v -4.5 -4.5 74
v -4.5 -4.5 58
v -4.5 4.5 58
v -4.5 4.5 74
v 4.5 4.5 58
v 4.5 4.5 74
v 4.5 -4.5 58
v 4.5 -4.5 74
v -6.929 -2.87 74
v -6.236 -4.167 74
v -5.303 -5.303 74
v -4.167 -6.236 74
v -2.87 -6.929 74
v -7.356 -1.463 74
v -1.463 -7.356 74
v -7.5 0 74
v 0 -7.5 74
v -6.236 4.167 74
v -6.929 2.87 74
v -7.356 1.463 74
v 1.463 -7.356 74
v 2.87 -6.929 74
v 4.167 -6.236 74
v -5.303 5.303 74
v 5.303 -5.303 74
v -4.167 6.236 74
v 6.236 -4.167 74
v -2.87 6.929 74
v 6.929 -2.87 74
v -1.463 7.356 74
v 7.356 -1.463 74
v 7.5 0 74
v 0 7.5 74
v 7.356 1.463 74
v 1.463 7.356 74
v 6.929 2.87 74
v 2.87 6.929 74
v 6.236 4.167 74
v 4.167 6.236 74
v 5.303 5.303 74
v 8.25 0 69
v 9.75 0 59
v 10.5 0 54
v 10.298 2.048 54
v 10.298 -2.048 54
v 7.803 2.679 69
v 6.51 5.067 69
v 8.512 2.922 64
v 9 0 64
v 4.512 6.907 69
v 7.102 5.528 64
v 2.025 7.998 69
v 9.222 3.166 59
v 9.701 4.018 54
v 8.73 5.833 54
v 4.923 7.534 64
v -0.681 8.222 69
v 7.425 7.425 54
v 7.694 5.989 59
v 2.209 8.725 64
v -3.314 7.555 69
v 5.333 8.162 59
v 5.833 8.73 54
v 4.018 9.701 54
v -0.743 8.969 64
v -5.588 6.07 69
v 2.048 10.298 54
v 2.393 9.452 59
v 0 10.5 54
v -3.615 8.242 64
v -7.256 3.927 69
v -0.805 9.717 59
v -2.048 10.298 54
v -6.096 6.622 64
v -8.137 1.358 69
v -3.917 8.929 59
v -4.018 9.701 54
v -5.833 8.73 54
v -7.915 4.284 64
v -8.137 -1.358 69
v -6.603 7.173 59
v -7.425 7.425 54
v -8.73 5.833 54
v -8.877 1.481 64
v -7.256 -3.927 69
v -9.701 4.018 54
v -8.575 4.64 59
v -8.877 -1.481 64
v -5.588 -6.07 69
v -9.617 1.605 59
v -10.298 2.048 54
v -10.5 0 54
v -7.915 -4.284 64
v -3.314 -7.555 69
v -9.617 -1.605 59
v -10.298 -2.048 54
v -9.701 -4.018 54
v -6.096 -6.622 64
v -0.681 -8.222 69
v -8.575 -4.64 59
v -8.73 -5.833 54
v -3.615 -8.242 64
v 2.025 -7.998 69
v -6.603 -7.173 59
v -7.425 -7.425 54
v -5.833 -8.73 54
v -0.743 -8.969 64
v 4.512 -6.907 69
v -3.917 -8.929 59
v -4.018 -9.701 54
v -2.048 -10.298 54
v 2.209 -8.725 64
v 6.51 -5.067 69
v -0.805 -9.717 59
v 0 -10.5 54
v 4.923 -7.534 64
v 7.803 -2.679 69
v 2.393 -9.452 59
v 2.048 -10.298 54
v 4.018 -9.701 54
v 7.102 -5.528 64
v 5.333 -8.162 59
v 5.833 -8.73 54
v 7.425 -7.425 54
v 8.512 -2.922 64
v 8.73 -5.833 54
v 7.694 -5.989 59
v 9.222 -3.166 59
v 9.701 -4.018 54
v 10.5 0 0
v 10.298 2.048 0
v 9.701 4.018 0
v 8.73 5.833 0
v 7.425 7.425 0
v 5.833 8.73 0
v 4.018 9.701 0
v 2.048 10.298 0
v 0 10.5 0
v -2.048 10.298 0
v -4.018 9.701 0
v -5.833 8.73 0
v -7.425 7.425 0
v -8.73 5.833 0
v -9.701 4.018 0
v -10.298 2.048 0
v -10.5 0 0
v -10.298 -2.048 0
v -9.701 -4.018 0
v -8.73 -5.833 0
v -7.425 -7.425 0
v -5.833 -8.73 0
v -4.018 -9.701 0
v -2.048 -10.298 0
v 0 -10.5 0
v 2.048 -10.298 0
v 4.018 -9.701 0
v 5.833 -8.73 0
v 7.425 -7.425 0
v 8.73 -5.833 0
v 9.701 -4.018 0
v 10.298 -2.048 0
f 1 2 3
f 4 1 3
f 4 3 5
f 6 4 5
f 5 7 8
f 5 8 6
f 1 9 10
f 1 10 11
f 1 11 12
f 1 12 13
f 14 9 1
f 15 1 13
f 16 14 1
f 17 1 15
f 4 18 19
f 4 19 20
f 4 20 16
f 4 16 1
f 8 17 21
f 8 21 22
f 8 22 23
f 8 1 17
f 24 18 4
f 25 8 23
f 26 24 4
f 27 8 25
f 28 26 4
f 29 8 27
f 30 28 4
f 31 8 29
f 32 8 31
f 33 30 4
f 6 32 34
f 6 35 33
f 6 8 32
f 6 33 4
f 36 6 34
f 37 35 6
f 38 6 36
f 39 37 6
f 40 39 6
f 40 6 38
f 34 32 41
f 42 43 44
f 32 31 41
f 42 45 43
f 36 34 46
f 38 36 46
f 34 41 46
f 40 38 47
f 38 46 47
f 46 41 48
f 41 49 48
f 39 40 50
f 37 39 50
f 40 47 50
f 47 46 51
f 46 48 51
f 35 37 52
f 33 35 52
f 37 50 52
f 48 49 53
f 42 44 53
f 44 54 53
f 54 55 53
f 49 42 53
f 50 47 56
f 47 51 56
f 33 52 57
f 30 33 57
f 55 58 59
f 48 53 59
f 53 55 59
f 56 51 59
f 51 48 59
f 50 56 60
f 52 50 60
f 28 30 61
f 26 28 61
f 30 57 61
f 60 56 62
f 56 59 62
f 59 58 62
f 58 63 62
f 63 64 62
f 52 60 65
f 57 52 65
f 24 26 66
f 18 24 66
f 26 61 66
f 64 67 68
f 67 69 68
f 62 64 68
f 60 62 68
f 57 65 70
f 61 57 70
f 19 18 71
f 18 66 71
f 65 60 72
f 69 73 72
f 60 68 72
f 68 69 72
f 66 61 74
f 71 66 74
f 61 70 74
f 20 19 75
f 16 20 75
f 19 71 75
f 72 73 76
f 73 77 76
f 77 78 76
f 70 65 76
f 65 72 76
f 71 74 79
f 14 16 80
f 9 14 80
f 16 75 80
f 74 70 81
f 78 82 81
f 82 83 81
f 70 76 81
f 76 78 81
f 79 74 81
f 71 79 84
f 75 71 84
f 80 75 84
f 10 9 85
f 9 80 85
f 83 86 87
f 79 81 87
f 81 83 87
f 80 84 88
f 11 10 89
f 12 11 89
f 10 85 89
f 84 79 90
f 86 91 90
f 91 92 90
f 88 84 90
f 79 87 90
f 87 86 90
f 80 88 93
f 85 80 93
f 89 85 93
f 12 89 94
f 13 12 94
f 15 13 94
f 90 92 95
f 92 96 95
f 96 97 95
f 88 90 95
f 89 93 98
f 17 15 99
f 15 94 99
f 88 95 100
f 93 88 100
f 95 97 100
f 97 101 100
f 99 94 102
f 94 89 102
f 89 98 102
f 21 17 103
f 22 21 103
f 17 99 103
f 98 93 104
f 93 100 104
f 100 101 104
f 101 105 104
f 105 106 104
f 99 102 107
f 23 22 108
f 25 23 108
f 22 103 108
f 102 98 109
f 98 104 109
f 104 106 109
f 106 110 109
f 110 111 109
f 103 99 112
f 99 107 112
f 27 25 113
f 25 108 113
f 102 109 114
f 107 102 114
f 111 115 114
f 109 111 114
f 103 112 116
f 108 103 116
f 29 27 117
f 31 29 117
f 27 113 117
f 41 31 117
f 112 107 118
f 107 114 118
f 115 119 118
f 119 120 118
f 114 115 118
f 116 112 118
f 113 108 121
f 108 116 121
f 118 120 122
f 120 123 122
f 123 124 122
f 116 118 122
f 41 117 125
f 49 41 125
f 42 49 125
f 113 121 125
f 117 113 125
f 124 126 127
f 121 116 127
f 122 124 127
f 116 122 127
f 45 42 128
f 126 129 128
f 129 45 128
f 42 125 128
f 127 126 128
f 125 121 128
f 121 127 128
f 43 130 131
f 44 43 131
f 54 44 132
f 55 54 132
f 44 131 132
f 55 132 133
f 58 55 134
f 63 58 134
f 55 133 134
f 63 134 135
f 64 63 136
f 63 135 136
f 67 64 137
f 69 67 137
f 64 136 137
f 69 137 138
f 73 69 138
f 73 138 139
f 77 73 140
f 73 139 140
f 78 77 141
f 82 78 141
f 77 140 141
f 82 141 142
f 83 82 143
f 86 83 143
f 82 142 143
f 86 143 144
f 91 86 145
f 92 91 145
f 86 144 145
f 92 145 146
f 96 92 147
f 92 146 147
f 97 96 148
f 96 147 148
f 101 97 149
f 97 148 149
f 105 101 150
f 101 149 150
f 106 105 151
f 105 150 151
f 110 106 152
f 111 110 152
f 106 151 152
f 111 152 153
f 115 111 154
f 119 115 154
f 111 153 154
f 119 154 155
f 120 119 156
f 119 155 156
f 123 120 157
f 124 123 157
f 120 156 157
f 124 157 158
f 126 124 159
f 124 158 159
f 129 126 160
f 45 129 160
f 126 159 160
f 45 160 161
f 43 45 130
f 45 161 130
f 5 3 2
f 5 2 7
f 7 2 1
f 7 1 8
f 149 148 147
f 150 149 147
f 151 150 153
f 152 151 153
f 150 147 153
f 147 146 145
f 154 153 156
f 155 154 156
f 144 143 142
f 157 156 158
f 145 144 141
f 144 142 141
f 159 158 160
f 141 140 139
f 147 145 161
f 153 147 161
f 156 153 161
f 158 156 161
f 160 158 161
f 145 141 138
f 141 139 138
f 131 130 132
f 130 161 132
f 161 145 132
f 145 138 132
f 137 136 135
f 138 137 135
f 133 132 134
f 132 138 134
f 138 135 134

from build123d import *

# Parameters (mm, degrees)
F0_R      = 10.5
F1_DEPTH  = 54
F3_R      = 7.5
F1_FACE_R = 10.5
F5_W      = 9
F5_H      = 9
F6_DEPTH  = 16


with BuildPart() as f1:
    # F0 (on Top) → F1 (new body)
    with BuildSketch(Plane.XY):
        Circle(F0_R)
    extrude(amount=F1_DEPTH)

    # F3 (on offset) → F4 section 0
    with BuildSketch(Plane.XY.offset(74)):
        Circle(F3_R)
    # F1_face (on face) → F4 section 1
    with BuildSketch(Plane.XY.offset(54)):
        Circle(F1_FACE_R)
    loft()

    # F5 (on face) → F6 (cut)
    with BuildSketch(Plane.XY.offset(74)):
        Rectangle(F5_W, F5_H)
    extrude(amount=-F6_DEPTH, mode=Mode.SUBTRACT)


solid = f1.part
